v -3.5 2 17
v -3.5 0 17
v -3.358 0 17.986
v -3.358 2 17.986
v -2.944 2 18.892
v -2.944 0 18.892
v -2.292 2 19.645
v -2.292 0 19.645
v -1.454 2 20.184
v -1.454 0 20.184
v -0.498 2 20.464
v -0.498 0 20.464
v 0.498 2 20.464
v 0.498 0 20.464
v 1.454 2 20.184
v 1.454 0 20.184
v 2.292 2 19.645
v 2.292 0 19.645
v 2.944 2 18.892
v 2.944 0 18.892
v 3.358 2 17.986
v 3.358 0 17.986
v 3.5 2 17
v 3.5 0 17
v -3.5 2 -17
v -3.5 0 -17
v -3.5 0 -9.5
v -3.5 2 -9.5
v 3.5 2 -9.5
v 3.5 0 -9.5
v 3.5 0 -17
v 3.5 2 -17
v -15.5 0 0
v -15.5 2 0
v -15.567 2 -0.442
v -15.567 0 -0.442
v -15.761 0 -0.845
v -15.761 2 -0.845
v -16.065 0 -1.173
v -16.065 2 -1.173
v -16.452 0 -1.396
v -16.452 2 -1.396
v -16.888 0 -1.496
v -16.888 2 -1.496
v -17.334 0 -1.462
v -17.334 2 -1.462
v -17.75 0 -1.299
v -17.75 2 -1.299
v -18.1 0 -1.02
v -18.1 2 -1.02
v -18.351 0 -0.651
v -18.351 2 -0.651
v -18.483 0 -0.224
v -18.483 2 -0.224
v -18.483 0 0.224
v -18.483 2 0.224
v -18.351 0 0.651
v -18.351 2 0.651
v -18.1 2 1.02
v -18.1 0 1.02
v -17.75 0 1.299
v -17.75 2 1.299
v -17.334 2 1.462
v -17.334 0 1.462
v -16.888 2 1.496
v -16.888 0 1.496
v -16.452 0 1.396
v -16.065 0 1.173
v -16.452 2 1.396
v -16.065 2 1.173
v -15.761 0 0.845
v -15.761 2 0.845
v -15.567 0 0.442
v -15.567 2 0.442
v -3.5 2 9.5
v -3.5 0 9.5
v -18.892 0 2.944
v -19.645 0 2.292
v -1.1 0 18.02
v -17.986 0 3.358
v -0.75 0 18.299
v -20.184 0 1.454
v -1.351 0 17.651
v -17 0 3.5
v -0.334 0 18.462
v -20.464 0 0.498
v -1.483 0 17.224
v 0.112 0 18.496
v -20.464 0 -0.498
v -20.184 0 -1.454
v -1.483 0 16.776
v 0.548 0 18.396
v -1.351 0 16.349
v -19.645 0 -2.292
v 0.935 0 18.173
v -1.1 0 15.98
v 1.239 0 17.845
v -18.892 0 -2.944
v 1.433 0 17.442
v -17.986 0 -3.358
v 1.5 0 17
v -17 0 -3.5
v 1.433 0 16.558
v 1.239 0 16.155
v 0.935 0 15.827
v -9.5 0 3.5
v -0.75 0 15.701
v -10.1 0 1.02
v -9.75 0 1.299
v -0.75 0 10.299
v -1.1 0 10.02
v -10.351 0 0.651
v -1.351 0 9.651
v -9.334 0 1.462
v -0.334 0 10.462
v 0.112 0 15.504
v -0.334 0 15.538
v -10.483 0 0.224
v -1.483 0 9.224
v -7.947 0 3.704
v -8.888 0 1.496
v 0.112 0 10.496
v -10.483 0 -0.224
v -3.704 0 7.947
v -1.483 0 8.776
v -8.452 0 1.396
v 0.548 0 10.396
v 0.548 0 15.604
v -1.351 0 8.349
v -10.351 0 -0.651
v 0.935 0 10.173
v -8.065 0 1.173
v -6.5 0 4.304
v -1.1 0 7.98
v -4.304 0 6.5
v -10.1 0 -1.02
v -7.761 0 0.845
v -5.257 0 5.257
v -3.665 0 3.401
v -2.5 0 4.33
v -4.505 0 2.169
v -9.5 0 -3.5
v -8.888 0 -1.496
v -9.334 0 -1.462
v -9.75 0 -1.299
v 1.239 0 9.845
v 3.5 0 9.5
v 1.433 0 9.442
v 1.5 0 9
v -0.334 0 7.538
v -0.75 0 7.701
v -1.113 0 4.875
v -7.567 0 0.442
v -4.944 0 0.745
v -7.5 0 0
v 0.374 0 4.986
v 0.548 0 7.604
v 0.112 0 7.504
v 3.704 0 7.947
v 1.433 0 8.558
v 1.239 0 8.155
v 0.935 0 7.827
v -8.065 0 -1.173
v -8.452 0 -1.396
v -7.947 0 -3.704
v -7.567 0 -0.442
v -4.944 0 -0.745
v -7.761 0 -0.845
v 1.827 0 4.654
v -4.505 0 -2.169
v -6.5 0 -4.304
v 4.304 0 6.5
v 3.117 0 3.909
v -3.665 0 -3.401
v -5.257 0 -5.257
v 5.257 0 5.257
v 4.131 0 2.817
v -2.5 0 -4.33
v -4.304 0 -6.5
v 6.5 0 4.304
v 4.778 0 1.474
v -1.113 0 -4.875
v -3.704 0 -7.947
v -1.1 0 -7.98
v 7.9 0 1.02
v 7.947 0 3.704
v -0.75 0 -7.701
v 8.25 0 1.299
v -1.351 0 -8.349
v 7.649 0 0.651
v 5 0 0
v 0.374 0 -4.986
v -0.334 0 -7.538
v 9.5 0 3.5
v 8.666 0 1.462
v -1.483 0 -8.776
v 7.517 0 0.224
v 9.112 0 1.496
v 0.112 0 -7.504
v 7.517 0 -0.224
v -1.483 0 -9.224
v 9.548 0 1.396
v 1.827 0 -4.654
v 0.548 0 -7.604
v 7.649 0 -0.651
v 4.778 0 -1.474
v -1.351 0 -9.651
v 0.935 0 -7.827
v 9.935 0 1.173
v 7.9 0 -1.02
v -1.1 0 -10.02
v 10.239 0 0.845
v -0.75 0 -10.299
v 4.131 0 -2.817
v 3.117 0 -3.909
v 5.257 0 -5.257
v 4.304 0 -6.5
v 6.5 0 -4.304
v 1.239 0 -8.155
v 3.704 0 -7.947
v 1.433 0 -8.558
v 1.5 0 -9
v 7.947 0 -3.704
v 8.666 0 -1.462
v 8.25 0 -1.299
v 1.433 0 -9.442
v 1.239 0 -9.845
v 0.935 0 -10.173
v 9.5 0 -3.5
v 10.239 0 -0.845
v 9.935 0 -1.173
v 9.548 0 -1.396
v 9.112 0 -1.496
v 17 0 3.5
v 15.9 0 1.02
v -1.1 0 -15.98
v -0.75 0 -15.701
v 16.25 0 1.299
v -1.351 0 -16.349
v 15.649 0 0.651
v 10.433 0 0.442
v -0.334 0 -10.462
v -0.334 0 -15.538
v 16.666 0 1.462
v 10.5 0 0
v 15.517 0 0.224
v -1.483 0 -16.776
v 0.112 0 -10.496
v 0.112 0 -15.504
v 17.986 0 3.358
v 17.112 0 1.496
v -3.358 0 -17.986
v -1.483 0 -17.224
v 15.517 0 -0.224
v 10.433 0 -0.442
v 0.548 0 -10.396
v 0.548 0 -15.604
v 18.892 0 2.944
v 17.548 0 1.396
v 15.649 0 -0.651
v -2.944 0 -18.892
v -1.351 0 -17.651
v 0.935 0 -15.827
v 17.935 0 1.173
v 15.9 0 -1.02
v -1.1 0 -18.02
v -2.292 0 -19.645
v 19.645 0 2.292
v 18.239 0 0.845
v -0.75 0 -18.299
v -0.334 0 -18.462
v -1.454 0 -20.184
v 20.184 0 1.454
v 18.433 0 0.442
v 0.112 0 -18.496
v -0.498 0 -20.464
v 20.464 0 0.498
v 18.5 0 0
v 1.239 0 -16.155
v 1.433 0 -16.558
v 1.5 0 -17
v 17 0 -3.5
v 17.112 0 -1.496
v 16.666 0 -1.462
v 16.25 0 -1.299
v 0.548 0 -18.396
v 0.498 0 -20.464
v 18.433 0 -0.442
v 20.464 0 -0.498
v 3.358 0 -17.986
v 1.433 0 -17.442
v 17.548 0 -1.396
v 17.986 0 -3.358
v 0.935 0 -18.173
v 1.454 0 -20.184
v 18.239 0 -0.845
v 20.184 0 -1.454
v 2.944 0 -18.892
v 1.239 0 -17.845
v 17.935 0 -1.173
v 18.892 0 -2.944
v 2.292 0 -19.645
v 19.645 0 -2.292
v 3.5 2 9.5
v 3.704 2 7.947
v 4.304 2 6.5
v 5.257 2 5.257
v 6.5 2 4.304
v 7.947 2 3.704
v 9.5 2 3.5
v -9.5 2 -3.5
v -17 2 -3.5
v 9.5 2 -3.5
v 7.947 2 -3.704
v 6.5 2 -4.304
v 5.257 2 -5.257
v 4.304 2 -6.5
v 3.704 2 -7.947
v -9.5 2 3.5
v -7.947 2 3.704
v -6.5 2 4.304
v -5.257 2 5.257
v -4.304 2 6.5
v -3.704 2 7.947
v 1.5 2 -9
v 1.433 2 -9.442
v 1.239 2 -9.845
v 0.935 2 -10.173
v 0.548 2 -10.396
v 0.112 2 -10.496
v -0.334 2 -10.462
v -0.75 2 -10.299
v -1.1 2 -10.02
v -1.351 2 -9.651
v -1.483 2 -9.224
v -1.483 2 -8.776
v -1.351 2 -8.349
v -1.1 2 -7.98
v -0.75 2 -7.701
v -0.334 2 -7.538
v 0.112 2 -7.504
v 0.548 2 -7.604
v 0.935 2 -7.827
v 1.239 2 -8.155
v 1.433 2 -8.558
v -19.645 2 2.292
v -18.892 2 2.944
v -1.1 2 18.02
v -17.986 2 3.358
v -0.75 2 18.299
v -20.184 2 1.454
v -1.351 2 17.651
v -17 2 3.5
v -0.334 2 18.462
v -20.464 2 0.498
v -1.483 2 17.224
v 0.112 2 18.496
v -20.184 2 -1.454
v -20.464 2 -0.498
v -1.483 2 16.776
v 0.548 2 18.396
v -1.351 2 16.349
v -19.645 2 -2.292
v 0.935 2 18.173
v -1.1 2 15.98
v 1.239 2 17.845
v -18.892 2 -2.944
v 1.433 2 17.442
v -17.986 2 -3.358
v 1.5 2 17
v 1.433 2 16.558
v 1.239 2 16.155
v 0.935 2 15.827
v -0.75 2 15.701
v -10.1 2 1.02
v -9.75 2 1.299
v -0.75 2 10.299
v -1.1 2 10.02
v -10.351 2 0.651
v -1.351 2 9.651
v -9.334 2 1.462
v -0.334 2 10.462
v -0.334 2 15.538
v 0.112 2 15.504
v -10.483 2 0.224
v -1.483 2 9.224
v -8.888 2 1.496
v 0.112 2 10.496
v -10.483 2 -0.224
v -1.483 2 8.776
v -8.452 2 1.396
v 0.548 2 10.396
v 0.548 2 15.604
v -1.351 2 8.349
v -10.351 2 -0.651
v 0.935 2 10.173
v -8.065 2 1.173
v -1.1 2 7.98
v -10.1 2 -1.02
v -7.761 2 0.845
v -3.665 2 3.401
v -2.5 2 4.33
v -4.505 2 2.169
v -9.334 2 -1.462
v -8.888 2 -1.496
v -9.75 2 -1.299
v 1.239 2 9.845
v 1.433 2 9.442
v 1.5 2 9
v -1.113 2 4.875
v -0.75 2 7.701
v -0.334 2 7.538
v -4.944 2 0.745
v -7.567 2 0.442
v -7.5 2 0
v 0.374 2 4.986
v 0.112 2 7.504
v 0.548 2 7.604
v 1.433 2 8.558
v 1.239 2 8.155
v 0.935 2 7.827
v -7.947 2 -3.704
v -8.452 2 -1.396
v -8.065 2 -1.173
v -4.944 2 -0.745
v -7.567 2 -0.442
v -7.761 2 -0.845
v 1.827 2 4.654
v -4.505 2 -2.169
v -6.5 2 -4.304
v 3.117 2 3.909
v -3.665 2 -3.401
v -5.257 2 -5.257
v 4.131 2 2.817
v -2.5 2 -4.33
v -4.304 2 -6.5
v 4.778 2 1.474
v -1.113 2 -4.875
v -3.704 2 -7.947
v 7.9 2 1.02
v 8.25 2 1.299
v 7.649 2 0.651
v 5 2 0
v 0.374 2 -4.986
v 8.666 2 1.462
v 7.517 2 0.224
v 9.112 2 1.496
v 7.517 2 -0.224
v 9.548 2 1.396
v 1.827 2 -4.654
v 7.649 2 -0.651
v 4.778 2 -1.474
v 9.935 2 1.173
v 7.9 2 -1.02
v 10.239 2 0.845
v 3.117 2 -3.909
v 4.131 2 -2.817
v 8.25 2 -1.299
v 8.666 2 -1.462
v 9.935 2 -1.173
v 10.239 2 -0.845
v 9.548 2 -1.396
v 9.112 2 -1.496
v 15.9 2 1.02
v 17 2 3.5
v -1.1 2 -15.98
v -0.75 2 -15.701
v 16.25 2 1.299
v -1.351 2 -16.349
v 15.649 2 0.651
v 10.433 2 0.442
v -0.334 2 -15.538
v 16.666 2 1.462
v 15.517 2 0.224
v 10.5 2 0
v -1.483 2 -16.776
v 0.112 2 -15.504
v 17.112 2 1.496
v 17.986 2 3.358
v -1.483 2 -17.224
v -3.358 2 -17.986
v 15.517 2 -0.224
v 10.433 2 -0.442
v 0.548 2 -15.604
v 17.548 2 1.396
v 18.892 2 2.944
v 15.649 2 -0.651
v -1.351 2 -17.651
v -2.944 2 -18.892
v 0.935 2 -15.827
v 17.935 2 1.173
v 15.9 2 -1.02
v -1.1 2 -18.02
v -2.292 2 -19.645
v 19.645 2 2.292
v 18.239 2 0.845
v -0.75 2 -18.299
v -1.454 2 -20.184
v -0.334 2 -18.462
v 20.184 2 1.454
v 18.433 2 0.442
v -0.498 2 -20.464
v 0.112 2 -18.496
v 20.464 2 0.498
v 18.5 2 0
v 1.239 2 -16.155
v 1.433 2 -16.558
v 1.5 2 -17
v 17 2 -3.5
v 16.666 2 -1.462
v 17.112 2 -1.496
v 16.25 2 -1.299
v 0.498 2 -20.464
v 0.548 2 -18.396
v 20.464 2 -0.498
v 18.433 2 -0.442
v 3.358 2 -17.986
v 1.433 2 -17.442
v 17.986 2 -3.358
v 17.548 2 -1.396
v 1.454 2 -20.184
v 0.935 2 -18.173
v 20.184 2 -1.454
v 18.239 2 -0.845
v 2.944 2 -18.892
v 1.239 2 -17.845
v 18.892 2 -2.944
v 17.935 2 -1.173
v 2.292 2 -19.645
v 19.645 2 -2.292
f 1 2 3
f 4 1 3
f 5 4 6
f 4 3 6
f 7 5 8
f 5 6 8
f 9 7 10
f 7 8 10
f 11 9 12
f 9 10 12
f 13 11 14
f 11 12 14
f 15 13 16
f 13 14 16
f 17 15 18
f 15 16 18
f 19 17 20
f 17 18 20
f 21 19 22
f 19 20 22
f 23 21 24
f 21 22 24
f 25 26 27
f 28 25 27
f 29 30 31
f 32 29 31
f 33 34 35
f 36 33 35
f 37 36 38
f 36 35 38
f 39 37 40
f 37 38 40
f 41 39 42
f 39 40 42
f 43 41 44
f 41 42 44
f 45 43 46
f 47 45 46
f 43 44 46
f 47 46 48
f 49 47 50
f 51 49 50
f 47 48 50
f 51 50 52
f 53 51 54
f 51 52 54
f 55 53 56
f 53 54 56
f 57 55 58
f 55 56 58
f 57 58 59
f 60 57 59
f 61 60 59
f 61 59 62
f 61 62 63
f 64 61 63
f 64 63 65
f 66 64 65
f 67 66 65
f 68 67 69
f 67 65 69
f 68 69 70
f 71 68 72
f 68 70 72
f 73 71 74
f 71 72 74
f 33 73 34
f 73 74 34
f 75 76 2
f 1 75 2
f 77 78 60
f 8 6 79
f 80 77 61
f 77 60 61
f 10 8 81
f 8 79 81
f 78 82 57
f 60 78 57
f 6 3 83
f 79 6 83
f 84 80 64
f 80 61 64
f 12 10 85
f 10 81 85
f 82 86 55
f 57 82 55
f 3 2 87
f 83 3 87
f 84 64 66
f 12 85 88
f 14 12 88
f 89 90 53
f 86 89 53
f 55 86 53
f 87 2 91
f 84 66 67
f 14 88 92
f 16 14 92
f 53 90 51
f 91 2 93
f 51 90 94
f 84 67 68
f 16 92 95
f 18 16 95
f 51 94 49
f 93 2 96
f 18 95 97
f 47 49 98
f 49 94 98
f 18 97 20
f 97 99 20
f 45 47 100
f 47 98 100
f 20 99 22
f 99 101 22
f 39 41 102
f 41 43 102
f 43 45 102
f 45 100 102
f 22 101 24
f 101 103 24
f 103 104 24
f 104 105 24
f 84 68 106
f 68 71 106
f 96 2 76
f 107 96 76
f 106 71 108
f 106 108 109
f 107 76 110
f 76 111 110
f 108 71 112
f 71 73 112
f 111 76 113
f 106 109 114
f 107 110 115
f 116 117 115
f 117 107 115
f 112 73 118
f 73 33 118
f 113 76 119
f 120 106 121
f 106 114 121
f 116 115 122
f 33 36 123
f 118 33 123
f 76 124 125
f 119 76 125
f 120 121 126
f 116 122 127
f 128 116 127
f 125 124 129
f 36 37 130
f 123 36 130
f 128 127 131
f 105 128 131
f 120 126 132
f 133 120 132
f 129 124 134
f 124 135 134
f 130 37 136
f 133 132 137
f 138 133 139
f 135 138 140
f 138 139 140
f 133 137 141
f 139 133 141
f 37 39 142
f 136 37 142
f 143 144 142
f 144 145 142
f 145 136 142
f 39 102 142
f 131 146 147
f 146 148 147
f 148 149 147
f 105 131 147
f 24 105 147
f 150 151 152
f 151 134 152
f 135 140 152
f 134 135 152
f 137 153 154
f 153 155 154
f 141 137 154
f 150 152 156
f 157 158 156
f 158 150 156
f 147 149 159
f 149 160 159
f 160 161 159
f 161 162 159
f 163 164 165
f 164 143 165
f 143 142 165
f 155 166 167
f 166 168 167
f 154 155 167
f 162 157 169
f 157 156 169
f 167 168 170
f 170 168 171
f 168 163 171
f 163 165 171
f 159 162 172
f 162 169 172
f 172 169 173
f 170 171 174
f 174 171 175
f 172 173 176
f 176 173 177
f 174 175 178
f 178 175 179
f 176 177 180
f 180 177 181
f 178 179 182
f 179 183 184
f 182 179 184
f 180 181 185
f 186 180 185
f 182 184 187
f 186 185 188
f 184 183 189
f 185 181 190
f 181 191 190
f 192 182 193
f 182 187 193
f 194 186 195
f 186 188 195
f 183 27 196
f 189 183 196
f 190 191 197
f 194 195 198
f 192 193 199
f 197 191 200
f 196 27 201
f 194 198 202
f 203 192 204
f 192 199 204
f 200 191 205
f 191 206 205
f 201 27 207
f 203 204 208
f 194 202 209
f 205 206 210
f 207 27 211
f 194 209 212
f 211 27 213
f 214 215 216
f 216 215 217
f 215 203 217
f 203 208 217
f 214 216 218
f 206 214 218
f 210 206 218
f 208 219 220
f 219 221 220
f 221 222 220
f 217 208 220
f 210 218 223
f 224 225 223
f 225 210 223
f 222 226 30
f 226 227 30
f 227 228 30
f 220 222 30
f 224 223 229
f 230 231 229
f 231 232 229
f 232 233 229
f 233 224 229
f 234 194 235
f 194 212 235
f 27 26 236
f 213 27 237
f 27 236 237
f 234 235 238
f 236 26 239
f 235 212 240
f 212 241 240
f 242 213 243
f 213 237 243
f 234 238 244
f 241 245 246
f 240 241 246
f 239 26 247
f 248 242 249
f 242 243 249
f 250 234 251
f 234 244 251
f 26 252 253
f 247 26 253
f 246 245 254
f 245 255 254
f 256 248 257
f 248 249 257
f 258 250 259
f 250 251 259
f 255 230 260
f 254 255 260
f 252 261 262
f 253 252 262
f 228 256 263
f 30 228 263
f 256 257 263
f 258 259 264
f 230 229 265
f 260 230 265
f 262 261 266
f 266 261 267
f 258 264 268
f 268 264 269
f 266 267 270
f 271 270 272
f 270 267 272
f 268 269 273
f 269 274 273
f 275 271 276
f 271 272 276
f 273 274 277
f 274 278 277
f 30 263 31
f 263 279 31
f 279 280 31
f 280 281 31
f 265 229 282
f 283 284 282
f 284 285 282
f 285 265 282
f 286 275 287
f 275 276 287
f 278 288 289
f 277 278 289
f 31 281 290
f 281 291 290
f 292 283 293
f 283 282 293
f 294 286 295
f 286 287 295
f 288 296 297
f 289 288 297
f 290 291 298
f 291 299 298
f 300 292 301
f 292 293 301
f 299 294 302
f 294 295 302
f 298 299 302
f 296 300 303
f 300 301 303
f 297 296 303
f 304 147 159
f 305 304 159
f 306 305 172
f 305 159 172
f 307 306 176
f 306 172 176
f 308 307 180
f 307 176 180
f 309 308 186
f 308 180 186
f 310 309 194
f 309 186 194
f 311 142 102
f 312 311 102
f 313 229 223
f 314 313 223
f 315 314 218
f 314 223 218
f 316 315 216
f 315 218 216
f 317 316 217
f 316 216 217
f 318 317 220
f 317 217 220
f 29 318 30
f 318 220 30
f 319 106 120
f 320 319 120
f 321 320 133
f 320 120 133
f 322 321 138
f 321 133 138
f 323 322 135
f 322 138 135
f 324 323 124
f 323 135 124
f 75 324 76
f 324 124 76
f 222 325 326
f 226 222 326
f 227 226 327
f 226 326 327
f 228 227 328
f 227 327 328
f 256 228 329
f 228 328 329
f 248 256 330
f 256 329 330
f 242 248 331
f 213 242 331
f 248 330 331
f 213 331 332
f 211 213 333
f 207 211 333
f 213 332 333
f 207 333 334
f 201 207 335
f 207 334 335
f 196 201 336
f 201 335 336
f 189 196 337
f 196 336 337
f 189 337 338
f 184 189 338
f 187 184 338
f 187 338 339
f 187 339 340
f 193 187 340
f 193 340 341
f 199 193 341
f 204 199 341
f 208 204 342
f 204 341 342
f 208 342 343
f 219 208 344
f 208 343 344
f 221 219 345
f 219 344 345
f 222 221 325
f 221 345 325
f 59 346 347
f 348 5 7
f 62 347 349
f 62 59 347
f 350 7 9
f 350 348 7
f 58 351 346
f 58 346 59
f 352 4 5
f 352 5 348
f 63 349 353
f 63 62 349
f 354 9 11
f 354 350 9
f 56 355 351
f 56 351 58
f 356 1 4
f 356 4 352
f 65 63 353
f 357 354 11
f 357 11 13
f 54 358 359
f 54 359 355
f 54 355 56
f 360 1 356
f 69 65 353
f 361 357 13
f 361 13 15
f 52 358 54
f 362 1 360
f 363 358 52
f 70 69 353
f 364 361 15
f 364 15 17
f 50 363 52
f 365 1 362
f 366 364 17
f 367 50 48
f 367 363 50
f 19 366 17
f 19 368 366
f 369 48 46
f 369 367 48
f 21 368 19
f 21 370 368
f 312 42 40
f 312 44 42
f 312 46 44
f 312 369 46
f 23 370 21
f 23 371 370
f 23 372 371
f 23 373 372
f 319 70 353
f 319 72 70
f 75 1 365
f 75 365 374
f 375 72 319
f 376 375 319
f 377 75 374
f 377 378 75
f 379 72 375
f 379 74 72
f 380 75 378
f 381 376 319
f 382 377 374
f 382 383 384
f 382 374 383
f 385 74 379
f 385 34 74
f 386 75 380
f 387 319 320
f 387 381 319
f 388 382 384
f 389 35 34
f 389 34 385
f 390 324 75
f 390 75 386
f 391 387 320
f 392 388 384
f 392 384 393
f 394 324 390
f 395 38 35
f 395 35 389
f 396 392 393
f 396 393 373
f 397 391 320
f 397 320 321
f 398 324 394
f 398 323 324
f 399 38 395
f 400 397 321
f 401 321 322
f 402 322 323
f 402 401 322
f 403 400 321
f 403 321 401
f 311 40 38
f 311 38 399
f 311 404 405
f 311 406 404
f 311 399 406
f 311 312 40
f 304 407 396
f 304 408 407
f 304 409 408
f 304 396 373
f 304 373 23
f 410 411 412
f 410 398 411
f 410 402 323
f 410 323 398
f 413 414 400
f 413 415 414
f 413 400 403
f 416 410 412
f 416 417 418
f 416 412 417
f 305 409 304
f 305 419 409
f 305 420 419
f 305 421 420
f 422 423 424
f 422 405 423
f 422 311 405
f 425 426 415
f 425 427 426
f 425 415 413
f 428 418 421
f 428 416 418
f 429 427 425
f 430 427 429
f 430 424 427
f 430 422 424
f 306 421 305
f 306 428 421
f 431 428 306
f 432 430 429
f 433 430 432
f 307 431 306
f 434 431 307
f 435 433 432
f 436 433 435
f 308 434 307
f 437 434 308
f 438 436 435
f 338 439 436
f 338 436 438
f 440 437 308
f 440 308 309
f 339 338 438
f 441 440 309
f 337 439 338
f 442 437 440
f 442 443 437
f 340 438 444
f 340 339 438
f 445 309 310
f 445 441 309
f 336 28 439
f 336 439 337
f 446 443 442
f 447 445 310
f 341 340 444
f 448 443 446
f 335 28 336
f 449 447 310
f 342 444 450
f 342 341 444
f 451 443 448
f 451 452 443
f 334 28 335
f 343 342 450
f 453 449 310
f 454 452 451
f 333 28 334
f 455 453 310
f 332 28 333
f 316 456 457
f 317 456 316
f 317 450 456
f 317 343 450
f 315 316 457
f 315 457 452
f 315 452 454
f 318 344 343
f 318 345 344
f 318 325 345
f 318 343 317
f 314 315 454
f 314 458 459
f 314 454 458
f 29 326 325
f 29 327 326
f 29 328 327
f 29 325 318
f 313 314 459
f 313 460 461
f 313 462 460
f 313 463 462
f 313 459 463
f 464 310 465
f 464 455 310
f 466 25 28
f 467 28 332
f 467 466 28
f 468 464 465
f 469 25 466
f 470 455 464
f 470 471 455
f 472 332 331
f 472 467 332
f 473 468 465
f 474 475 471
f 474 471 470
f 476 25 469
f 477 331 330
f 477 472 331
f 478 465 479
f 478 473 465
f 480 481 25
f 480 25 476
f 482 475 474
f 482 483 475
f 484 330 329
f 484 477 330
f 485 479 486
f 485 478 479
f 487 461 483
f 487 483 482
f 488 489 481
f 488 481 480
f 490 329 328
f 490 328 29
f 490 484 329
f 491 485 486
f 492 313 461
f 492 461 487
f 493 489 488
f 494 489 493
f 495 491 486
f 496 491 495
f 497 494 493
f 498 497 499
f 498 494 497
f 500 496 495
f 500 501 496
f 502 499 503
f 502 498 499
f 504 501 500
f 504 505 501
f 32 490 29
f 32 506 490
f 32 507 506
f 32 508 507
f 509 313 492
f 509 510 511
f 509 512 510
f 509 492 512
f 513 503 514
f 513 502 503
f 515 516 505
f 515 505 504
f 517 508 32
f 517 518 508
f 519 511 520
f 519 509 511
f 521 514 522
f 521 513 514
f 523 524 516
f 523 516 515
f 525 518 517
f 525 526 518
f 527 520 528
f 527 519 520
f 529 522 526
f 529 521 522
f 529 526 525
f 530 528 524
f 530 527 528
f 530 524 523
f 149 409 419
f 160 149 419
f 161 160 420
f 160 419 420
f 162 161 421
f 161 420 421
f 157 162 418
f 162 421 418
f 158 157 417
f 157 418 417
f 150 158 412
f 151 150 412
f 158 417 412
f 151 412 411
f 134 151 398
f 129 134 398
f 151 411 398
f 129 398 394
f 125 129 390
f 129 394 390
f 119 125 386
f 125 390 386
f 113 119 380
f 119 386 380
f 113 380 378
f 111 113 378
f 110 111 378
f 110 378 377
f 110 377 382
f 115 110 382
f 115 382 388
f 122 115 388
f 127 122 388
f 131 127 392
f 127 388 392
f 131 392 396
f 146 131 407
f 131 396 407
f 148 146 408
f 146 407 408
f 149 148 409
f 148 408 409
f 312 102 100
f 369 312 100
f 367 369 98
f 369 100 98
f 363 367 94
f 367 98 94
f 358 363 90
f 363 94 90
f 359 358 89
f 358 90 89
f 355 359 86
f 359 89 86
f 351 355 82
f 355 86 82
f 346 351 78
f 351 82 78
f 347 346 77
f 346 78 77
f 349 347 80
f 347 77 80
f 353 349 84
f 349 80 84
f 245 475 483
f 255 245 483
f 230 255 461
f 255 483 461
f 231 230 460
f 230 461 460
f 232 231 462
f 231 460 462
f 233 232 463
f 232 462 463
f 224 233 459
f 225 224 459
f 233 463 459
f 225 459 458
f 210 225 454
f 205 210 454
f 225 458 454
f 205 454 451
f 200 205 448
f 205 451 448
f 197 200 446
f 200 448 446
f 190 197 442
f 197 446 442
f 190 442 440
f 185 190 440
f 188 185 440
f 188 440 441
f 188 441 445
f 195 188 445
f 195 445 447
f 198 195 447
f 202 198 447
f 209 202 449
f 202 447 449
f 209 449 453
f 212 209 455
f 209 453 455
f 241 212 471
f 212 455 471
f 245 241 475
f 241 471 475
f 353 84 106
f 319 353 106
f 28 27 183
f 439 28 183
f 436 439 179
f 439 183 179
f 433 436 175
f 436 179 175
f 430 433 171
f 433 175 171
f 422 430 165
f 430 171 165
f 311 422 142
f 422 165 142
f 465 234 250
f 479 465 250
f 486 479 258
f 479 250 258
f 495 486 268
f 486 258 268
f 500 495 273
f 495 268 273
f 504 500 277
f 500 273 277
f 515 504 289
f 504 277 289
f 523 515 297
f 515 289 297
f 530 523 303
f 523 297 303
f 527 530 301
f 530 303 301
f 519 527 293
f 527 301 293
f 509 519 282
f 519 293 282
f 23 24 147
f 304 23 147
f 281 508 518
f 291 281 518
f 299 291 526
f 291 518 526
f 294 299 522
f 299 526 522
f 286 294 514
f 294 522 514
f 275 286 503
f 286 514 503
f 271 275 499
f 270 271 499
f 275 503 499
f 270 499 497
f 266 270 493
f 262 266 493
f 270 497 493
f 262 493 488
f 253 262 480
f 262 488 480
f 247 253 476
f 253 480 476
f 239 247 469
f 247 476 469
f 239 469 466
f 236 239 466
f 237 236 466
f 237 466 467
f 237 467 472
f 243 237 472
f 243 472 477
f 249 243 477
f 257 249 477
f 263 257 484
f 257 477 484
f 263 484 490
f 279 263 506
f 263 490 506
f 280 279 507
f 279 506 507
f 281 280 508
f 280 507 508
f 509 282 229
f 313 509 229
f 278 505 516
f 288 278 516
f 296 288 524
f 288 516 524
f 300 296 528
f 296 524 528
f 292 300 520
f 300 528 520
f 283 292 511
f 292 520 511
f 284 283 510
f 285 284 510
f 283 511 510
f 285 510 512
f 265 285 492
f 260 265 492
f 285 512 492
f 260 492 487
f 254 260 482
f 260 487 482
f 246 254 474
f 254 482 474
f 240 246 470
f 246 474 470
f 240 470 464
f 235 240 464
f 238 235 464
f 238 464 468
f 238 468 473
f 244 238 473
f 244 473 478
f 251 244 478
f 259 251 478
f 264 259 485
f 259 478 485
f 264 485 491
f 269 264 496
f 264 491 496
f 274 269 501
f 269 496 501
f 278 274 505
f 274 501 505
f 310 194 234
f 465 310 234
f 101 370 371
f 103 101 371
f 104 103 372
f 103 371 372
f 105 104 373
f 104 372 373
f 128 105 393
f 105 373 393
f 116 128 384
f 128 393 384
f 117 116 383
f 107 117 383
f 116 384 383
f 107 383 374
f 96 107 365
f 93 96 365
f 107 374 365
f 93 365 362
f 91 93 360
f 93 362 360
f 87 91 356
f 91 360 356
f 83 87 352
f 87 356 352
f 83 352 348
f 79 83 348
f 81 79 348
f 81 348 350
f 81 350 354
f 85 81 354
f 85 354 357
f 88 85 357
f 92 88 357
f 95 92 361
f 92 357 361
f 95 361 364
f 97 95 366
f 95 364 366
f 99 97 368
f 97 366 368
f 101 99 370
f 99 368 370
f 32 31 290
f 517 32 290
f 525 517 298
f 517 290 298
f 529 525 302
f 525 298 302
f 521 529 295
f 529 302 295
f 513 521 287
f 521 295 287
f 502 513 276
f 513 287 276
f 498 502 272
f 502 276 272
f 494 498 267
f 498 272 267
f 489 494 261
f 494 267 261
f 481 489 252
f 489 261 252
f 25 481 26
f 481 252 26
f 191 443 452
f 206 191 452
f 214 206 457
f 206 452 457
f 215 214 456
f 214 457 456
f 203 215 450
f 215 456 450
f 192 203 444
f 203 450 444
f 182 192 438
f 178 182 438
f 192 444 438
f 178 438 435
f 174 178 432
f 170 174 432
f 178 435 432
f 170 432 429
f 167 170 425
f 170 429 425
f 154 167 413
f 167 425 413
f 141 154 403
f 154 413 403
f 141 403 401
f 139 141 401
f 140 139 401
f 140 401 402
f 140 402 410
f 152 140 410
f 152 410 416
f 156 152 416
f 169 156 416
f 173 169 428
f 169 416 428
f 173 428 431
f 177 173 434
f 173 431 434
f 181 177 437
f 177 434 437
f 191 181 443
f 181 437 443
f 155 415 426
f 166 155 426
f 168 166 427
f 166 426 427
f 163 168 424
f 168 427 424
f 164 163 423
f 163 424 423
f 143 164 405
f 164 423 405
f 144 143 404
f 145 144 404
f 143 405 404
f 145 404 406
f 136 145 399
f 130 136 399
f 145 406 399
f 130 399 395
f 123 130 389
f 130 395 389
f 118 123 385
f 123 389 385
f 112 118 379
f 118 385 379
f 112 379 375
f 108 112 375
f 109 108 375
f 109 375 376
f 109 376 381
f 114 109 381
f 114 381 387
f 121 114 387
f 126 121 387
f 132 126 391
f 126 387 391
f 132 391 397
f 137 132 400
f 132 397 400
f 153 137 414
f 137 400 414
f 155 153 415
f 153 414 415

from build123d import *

# Parameters (mm, degrees)
BOSS_EXTRUDE1_DEPTH = 2
SKETCH2_R           = 1.5
SKETCH2_R_2         = 5
CUT_EXTRUDE1_DEPTH  = 2


with BuildPart() as part:
    # Sketch1 → Boss-Extrude1 (new body)
    with BuildSketch(Plane(origin=(0, 0, 0), x_dir=(1, 0, 0), z_dir=(0, 1, 0))):
        with BuildLine():
            Line((-3.5, 17), (-3.5, 9.5))
            ThreePointArc((-3.5, 9.5), (-5.257359313, 5.257359313), (-9.5, 3.5))
            Line((-9.5, 3.5), (-17, 3.5))
            ThreePointArc((-17, 3.5), (-20.5, 0), (-17, -3.5))
            Line((-17, -3.5), (-9.5, -3.5))
            ThreePointArc((-9.5, -3.5), (-5.257359313, -5.257359313), (-3.5, -9.5))
            Line((-3.5, -9.5), (-3.5, -17))
            ThreePointArc((-3.5, -17), (0, -20.5), (3.5, -17))
            Line((3.5, -17), (3.5, -9.5))
            ThreePointArc((3.5, -9.5), (5.257359313, -5.257359313), (9.5, -3.5))
            Line((9.5, -3.5), (17, -3.5))
            ThreePointArc((17, -3.5), (20.5, 0), (17, 3.5))
            Line((17, 3.5), (9.5, 3.5))
            ThreePointArc((9.5, 3.5), (5.257359313, 5.257359313), (3.5, 9.5))
            Line((3.5, 9.5), (3.5, 17))
            ThreePointArc((3.5, 17), (0, 20.5), (-3.5, 17))
        make_face()
    extrude(amount=BOSS_EXTRUDE1_DEPTH)

    # Sketch2 → Cut-Extrude1 (cut)
    with BuildSketch(Plane(origin=(0, 2, 0), x_dir=(1, 0, 0), z_dir=(0, 1, 0))):
        with Locations((0, 17)):
            Circle(SKETCH2_R)
        with Locations((0, 9)):
            Circle(SKETCH2_R)
        Circle(SKETCH2_R_2)
        with Locations((17, 0)):
            Circle(SKETCH2_R)
        with Locations((9, 0)):
            Circle(SKETCH2_R)
        with Locations((0, -17)):
            Circle(SKETCH2_R)
        with Locations((0, -9)):
            Circle(SKETCH2_R)
        with Locations((-17, 0)):
            Circle(SKETCH2_R)
        with Locations((-9, 0)):
            Circle(SKETCH2_R)
    extrude(amount=-CUT_EXTRUDE1_DEPTH, mode=Mode.SUBTRACT)


solid = part.part
